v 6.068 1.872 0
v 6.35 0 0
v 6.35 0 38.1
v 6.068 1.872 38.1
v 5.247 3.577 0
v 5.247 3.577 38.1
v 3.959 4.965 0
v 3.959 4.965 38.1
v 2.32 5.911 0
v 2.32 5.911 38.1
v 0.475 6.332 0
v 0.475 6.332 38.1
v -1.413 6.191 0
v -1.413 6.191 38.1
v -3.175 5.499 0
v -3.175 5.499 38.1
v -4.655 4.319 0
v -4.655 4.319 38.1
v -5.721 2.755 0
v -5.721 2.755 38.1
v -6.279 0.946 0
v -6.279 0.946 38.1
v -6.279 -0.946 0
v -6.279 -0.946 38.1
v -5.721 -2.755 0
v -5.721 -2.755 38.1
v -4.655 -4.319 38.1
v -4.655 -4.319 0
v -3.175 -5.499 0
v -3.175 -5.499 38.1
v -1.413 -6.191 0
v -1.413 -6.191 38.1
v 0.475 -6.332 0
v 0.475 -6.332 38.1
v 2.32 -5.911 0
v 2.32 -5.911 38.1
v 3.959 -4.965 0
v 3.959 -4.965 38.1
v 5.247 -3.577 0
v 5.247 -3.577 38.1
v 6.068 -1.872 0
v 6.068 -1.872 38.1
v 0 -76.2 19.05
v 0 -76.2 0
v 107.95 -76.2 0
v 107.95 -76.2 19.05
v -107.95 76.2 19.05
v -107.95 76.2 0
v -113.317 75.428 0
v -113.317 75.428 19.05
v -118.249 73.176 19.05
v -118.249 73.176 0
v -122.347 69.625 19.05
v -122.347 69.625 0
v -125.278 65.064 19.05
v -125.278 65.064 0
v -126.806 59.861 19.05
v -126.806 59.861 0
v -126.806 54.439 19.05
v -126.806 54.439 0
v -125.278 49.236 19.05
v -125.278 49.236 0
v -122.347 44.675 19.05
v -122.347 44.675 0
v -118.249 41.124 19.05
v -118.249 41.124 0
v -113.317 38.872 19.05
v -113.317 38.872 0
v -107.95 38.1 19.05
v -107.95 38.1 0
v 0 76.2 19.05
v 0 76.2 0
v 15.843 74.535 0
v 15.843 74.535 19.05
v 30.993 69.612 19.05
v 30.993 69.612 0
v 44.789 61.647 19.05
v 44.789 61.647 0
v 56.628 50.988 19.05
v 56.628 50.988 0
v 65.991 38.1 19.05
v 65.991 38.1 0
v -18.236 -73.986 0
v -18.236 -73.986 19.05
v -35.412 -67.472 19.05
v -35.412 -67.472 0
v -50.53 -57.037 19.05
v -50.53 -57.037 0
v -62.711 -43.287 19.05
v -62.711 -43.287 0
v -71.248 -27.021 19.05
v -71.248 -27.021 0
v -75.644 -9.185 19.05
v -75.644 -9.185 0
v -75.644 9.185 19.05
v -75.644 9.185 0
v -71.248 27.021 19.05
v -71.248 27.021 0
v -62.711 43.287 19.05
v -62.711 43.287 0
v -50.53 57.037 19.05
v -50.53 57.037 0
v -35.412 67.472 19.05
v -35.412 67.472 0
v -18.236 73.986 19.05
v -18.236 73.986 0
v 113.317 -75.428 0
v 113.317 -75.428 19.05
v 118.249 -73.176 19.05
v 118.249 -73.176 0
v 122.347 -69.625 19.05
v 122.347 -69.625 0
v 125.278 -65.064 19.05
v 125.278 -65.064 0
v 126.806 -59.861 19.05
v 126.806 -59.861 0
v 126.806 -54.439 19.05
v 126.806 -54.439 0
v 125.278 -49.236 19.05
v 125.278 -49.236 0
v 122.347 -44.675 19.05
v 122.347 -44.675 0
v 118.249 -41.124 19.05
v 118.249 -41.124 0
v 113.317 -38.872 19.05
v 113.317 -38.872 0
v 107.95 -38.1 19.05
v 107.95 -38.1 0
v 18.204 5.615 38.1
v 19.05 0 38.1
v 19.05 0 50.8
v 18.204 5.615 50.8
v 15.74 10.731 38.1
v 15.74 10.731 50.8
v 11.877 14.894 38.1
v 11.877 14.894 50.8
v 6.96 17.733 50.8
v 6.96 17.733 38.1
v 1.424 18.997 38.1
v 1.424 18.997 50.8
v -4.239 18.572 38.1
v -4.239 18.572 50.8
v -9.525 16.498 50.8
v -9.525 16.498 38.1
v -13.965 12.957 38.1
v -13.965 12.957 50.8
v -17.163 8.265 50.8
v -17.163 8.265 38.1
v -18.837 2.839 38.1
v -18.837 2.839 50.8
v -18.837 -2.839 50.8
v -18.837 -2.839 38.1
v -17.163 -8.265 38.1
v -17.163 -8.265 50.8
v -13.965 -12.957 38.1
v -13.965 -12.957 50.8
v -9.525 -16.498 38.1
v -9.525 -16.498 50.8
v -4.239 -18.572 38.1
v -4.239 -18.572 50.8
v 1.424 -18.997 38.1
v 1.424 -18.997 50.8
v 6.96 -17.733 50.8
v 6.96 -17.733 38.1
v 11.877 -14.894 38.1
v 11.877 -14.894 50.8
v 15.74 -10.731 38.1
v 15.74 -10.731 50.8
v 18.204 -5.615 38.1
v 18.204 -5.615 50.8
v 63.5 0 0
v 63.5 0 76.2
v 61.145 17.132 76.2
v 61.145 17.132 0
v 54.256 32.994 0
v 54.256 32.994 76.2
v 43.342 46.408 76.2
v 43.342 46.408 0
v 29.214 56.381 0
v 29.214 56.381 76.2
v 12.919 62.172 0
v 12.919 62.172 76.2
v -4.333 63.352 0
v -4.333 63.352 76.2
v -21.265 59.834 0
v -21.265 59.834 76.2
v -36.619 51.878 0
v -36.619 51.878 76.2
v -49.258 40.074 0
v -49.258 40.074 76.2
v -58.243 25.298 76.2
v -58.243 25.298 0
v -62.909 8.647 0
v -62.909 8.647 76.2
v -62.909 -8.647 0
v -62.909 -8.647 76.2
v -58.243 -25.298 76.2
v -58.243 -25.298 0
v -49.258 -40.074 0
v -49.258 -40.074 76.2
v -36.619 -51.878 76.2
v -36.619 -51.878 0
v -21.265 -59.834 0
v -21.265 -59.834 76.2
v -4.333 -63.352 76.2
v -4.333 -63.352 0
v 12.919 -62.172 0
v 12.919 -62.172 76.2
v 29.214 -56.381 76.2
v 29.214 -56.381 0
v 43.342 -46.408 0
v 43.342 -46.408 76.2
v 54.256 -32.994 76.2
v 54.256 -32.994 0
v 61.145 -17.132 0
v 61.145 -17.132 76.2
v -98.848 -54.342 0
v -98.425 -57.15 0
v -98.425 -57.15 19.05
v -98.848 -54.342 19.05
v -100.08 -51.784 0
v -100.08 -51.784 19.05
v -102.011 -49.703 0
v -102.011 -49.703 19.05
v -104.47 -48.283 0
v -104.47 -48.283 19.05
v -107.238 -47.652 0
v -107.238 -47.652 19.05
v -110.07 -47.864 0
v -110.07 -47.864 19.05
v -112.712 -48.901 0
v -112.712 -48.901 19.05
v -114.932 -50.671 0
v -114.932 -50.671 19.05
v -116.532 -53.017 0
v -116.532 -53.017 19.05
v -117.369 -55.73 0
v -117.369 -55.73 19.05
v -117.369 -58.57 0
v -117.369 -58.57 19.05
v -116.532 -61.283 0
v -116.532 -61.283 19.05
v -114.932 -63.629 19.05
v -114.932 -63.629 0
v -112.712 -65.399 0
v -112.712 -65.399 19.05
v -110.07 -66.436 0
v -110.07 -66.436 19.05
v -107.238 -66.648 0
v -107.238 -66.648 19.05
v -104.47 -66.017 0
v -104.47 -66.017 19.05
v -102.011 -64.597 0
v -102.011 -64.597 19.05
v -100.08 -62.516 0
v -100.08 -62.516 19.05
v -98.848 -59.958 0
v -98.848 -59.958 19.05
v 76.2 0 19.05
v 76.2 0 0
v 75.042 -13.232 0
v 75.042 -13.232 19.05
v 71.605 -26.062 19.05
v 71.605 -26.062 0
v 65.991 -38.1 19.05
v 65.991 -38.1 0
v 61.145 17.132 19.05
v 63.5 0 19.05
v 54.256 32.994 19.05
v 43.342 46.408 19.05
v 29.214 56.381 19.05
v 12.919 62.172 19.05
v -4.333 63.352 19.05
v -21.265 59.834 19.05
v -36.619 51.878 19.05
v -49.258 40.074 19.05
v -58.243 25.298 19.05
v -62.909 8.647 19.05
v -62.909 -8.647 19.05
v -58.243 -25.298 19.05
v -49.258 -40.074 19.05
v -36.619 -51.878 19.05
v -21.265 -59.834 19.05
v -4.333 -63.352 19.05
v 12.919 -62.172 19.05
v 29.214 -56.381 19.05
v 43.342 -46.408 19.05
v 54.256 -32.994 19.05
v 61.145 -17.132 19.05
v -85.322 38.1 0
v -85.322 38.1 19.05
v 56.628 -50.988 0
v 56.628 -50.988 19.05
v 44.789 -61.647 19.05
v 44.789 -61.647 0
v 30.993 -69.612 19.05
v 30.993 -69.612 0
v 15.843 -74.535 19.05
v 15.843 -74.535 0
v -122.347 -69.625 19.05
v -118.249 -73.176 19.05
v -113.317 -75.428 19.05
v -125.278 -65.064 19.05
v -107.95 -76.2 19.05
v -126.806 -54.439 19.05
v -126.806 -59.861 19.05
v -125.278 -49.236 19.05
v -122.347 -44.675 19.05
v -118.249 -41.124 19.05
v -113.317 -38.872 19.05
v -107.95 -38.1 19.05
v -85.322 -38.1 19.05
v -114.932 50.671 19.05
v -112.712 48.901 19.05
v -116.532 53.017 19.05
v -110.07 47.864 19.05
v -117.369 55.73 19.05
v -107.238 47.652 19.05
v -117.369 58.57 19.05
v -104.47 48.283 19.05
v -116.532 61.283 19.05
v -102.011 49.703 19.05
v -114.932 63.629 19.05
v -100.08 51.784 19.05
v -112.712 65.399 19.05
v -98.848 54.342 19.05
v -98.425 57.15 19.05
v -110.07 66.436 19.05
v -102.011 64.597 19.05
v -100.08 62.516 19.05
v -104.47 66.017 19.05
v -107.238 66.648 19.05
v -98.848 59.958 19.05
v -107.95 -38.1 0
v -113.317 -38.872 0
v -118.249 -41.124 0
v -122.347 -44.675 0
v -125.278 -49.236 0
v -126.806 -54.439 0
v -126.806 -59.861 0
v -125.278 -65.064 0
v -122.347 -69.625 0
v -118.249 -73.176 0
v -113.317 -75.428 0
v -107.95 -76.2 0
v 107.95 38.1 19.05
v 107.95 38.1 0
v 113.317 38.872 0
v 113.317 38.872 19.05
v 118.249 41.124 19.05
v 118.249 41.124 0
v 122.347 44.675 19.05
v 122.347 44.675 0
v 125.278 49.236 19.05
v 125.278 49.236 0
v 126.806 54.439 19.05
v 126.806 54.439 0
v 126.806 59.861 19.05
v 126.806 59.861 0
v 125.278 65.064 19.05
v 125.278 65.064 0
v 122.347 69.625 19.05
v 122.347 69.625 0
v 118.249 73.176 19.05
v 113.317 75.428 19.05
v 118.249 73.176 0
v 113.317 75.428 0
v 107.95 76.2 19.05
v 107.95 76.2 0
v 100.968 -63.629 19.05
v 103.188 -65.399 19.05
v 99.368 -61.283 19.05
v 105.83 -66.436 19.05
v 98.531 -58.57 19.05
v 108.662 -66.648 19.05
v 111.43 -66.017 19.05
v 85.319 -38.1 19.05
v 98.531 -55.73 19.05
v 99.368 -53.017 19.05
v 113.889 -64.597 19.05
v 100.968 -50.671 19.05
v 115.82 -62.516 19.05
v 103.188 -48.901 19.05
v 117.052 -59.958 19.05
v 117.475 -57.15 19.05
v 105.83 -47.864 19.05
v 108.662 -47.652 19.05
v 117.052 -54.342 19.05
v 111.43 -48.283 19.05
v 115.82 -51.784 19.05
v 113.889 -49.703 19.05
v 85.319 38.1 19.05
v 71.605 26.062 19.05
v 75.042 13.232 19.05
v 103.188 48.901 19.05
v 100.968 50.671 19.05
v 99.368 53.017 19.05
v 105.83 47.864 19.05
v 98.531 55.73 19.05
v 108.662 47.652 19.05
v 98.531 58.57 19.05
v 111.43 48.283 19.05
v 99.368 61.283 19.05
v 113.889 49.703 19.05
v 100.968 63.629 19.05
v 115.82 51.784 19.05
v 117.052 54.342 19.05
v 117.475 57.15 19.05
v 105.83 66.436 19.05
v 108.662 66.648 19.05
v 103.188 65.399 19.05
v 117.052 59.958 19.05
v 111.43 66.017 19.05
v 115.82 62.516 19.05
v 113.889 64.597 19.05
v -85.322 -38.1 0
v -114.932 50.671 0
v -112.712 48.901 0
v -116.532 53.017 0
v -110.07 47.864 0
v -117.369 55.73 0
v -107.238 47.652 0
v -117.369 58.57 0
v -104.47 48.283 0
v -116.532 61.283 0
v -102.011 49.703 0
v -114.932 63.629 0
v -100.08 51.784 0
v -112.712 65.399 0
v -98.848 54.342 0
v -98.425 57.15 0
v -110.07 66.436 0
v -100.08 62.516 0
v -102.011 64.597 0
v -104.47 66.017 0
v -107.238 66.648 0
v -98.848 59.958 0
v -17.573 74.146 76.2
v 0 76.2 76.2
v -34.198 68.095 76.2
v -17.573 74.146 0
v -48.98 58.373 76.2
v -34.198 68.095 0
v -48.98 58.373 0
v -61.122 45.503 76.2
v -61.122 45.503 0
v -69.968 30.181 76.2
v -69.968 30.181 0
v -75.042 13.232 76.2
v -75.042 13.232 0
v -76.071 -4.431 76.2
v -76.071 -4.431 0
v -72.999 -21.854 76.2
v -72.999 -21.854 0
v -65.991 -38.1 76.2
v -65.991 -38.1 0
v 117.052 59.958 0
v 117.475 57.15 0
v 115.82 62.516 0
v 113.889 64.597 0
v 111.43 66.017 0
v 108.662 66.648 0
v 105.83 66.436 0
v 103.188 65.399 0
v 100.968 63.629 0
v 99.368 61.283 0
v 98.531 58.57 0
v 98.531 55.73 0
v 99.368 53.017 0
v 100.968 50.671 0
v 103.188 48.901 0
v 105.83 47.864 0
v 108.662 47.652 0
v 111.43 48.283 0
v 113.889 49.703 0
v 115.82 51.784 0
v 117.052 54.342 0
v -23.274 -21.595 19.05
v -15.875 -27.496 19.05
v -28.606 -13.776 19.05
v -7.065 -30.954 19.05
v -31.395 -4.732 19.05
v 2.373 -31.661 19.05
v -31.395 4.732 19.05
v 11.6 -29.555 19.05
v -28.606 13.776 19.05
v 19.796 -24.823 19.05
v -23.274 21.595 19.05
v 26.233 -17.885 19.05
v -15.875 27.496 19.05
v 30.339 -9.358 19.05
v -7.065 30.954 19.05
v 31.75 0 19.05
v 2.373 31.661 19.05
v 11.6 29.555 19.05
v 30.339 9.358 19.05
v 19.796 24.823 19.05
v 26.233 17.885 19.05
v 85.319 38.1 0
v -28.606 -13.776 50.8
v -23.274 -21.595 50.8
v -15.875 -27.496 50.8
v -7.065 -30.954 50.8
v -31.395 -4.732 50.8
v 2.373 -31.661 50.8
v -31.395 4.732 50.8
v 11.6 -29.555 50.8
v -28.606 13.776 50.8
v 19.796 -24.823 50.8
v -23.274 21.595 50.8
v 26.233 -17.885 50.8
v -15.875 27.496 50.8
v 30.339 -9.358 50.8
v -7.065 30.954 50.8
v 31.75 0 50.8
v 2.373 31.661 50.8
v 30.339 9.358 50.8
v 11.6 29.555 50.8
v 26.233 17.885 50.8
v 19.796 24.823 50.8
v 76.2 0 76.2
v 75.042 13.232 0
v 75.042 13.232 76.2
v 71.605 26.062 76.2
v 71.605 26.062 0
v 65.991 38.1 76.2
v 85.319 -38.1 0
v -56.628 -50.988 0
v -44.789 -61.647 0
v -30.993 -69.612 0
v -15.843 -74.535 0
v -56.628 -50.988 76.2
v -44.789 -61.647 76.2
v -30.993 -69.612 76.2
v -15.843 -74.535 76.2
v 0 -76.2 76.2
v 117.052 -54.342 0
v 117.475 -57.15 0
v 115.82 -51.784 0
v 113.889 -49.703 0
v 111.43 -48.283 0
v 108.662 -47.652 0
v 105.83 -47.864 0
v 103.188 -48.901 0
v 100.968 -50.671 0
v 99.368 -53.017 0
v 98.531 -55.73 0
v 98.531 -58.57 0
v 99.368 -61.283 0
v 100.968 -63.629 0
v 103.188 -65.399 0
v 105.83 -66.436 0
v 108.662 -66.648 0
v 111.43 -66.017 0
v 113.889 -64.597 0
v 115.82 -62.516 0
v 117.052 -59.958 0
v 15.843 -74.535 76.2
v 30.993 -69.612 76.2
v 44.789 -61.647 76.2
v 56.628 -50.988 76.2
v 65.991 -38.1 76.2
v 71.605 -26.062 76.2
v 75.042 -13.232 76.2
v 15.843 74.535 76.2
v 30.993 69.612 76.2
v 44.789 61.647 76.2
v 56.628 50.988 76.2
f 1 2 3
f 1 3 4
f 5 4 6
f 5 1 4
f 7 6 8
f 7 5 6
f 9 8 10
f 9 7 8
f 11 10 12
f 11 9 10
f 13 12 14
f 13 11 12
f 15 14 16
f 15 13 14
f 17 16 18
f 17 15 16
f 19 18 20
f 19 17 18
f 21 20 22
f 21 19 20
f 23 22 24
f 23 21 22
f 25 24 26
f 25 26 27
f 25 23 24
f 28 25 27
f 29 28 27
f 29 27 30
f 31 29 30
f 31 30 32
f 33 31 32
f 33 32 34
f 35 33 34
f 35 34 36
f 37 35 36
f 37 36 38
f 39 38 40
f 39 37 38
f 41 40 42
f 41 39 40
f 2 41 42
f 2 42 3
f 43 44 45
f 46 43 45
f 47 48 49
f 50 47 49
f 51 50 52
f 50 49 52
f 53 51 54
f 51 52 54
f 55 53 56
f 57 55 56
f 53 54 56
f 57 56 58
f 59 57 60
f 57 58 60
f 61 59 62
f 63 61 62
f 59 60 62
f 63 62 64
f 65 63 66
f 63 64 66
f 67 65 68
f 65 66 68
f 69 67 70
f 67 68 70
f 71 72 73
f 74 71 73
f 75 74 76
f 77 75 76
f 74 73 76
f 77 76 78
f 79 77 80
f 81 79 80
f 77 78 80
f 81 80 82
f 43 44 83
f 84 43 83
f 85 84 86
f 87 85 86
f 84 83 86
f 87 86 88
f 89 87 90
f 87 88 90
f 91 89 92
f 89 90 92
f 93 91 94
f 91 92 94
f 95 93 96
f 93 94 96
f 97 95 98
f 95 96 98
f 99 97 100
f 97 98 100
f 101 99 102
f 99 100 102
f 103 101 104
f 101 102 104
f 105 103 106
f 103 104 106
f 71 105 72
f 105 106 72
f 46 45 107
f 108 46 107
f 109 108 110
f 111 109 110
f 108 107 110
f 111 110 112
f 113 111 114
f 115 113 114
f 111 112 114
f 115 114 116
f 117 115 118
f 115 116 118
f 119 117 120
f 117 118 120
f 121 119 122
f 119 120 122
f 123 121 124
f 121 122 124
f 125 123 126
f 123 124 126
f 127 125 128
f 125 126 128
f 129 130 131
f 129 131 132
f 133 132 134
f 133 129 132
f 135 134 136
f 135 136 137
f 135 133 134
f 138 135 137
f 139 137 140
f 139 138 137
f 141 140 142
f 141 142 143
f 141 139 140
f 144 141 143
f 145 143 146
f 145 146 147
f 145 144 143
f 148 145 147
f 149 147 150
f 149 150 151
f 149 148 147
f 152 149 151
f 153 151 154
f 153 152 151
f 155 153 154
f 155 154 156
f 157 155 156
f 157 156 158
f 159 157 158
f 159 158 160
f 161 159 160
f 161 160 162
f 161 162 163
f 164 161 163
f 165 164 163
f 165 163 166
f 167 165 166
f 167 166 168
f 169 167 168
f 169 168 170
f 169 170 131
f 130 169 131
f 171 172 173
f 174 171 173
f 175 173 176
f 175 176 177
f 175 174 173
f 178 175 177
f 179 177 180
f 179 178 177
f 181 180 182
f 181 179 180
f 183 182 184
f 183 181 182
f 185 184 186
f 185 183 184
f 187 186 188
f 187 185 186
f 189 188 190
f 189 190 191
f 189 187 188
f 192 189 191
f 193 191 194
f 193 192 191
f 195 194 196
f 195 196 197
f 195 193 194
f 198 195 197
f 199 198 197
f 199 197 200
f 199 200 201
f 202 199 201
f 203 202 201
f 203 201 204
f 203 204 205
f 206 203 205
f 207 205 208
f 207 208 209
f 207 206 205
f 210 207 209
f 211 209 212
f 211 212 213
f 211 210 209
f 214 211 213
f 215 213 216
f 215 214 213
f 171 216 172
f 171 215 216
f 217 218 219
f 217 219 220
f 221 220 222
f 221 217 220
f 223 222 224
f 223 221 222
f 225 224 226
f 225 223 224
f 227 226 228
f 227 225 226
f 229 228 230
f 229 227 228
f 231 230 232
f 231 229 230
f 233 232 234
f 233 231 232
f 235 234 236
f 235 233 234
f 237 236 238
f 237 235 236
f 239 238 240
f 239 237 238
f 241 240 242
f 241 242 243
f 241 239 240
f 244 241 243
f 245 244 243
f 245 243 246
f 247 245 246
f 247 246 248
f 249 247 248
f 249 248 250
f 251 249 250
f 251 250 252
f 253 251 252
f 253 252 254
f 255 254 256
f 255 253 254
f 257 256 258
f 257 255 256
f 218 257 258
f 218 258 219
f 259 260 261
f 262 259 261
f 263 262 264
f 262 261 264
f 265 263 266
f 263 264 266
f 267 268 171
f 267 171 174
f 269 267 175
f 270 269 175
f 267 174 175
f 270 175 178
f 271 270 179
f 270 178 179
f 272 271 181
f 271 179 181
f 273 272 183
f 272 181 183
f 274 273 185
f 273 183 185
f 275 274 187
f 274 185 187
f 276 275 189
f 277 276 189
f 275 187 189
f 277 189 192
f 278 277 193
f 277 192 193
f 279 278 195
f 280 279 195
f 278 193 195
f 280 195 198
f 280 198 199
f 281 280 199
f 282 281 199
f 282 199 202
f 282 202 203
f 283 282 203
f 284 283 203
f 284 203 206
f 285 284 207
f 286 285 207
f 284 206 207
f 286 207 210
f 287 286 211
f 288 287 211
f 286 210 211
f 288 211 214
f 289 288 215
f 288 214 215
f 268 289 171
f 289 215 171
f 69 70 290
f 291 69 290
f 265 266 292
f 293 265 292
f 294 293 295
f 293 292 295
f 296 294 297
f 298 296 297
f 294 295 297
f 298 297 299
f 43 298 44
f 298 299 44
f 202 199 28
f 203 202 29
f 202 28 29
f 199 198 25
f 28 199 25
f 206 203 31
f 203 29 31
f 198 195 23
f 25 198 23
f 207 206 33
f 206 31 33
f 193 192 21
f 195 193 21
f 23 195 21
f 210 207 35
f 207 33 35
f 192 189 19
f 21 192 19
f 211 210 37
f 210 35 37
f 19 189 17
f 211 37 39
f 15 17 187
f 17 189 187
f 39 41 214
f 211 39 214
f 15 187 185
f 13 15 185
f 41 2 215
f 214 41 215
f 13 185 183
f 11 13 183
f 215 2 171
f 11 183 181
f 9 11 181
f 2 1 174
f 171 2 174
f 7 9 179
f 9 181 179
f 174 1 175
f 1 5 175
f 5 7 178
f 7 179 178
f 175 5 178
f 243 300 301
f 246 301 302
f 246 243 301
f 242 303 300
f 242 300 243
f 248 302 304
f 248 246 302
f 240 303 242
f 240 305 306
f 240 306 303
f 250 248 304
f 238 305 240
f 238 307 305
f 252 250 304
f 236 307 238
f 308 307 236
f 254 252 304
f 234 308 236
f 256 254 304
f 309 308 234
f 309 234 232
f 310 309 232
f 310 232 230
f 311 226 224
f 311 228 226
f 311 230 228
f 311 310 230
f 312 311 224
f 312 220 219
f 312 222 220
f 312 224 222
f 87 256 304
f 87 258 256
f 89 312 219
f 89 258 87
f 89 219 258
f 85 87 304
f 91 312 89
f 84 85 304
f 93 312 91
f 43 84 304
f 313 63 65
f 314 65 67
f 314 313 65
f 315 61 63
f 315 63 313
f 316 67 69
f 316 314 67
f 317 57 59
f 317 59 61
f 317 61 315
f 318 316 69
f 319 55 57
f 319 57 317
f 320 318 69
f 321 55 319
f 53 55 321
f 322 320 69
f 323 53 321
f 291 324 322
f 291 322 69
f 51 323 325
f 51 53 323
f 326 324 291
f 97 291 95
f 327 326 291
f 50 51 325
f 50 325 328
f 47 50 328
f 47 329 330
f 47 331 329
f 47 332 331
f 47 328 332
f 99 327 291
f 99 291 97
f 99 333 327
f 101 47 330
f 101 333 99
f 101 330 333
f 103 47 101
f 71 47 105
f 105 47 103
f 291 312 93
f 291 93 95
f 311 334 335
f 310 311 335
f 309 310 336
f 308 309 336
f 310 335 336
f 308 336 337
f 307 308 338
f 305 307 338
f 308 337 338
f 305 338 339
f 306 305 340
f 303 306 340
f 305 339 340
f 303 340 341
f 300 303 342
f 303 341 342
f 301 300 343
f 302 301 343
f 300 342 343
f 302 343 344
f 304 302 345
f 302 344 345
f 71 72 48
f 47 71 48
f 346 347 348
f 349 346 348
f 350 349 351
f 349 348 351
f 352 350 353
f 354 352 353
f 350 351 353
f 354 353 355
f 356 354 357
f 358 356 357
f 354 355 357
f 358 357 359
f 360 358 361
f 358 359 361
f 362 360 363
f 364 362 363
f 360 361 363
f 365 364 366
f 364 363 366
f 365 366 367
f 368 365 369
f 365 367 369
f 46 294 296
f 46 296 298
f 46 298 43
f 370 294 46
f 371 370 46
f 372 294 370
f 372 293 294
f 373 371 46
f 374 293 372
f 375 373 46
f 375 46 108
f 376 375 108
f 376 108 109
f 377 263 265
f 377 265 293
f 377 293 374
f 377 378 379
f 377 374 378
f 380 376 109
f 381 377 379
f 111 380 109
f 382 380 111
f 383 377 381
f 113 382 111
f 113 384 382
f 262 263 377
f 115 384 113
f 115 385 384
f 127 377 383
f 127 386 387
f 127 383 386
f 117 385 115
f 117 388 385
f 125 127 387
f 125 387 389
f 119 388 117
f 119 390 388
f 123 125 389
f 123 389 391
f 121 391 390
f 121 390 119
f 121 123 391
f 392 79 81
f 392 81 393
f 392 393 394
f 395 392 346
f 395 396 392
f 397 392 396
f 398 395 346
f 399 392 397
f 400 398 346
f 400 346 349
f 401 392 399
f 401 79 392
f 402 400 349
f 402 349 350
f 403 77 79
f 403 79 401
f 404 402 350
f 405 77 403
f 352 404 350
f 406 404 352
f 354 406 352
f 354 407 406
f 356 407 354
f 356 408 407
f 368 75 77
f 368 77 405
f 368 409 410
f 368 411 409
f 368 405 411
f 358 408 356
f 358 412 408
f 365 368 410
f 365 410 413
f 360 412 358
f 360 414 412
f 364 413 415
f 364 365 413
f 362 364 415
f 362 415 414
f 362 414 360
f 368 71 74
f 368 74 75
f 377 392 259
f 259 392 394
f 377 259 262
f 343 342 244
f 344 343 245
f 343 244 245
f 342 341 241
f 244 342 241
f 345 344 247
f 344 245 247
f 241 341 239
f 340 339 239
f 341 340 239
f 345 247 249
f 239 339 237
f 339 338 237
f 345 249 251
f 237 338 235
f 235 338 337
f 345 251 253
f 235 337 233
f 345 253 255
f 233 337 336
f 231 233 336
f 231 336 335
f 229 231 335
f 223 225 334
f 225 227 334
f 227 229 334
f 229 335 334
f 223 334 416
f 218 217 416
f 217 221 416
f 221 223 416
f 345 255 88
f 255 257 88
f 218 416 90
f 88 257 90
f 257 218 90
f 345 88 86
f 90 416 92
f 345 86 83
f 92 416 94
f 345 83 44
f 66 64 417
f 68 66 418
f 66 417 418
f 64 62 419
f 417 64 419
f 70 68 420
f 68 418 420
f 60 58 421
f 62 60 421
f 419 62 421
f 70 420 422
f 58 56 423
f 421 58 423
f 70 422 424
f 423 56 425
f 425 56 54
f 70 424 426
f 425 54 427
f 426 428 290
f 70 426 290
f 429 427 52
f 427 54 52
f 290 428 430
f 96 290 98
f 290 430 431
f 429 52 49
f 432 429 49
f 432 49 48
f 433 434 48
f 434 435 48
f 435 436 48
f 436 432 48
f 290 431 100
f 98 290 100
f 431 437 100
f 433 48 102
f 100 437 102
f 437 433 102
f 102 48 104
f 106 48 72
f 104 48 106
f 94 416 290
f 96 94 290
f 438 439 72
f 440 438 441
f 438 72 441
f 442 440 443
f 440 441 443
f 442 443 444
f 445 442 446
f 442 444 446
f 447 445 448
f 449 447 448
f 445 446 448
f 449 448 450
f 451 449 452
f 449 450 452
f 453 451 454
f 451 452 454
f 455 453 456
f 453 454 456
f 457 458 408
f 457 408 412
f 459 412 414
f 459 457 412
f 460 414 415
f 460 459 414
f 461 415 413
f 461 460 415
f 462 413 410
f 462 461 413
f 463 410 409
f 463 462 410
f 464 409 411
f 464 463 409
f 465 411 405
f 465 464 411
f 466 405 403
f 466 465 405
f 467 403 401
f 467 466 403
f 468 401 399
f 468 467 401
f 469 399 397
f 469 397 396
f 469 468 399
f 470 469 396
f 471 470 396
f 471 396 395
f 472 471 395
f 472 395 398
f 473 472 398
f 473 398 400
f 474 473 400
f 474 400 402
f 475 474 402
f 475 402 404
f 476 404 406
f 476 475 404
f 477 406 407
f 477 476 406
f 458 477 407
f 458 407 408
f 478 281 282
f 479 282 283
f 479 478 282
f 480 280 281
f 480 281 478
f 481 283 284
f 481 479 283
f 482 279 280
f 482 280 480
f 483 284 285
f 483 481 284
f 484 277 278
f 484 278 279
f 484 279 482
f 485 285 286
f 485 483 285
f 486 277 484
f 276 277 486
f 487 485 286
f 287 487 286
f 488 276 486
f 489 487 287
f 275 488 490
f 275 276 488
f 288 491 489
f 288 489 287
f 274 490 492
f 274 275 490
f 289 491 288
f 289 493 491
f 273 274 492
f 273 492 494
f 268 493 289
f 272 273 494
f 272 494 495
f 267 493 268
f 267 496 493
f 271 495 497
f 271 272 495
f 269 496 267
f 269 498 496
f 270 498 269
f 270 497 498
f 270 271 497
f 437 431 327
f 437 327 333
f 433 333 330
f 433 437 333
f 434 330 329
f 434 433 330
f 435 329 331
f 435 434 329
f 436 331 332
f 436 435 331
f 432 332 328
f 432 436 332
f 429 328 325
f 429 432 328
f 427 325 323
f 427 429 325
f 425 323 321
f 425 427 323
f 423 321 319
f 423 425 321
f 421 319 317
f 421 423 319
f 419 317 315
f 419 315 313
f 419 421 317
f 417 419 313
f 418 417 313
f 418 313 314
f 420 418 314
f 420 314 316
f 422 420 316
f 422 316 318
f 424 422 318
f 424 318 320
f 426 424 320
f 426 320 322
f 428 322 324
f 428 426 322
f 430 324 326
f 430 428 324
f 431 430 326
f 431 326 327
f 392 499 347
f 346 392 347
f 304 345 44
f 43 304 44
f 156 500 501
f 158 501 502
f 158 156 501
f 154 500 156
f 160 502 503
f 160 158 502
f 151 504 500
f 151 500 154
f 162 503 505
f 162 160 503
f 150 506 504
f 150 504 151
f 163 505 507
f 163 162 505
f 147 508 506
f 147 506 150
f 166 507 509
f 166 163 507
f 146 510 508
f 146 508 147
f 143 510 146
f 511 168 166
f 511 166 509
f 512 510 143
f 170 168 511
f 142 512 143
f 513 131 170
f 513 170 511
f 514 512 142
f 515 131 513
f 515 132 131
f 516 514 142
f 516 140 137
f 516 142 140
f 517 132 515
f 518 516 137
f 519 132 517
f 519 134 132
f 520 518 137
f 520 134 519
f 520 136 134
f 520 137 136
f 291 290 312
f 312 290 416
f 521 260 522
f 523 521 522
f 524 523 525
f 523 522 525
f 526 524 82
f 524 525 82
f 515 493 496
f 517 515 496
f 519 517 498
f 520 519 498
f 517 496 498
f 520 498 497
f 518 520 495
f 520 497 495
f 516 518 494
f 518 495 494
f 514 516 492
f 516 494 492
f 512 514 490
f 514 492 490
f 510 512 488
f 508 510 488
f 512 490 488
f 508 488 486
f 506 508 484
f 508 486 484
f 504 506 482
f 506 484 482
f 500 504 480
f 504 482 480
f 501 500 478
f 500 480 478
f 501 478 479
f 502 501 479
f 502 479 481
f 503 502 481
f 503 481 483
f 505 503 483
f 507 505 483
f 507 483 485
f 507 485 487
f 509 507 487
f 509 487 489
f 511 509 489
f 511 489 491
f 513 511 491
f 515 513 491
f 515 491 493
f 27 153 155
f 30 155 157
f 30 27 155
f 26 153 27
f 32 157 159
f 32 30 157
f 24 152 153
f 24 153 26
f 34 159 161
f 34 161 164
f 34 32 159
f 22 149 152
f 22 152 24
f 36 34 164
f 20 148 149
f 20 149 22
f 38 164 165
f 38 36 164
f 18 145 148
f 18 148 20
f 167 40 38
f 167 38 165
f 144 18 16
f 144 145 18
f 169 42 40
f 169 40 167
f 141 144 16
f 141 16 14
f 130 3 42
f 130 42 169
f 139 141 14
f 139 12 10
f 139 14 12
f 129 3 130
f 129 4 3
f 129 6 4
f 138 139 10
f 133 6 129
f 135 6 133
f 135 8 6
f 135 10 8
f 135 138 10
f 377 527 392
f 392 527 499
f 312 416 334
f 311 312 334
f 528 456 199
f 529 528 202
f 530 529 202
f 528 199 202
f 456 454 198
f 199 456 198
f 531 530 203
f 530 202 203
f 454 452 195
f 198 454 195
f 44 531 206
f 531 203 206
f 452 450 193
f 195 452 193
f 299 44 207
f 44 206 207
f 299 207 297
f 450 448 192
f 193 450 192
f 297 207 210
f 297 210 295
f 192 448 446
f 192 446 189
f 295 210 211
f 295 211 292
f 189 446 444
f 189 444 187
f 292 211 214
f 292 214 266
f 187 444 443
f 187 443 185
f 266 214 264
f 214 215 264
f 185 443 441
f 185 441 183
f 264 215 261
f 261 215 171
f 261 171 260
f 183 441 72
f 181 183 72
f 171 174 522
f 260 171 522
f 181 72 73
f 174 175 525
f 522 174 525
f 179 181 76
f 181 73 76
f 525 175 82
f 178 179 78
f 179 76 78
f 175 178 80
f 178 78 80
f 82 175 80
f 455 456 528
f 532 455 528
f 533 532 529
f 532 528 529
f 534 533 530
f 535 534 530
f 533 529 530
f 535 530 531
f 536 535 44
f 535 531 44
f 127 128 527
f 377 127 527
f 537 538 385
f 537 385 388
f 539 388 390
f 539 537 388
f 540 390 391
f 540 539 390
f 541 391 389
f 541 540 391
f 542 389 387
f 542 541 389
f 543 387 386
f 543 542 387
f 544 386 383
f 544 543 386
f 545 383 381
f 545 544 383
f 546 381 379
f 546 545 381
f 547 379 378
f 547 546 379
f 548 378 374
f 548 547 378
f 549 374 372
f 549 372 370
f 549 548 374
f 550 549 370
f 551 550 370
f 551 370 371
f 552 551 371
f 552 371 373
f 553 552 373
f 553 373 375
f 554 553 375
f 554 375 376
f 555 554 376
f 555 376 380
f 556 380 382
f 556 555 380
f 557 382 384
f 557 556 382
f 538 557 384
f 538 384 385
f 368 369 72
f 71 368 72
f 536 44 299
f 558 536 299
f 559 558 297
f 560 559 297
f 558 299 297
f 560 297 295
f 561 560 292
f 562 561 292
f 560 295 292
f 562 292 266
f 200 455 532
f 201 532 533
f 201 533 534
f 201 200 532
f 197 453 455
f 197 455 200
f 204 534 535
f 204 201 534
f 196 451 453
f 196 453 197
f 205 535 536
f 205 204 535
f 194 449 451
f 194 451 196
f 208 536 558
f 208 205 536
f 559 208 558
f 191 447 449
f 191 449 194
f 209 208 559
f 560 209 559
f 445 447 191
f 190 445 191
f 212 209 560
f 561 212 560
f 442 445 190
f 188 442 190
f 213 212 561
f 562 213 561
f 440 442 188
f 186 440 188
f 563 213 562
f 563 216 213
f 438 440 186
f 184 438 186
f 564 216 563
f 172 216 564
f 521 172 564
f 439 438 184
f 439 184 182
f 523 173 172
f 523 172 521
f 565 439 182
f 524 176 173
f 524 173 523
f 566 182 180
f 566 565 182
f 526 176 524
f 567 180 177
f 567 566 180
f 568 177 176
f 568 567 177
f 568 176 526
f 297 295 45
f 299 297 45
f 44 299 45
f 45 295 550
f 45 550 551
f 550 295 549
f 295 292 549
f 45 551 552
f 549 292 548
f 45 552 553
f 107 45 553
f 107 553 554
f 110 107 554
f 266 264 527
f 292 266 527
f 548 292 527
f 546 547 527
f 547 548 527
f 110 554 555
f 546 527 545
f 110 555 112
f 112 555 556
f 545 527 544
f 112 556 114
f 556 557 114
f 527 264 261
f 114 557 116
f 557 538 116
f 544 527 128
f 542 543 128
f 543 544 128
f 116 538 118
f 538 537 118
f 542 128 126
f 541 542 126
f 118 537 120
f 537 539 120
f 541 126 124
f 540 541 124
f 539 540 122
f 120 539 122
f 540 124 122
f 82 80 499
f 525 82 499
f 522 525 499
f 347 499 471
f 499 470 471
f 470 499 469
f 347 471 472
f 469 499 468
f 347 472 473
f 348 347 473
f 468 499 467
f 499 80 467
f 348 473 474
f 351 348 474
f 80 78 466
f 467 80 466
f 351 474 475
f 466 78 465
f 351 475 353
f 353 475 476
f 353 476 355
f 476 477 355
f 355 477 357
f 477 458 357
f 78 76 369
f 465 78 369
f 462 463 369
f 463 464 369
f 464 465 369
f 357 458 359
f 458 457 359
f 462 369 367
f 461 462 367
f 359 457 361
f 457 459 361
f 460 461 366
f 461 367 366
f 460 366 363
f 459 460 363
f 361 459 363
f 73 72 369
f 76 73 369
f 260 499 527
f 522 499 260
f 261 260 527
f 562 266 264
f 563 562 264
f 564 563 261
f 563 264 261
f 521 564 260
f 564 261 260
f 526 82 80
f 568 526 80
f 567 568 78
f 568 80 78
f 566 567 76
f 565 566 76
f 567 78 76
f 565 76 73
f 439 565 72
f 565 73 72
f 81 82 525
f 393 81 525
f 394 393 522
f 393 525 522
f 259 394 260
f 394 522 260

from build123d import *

# Parameters (mm, degrees)
F0_R     = 9.525
F1_DEPTH = 19.05
F0_R_2   = 63.5
F0_R_3   = 31.75
F2_DEPTH = 76.2
F0_R_4   = 19.05
F3_DEPTH = 50.8
F0_R_5   = 6.35
F4_DEPTH = 38.1


with BuildPart() as f1:
    # F0 (on Top) → F1 (new body)
    with BuildSketch(Plane.XY):
        with BuildLine():
            Line((-107.95, -76.2), (0, -76.2))
            ThreePointArc((0, -76.2), (-38.1, -65.9911357684), (-65.9911357684, -38.1))
            Line((-65.9911357684, -38.1), (-85.3222459555, -38.1))
            Line((-85.3222459555, -38.1), (-107.95, -38.1))
            ThreePointArc((-107.95, -38.1), (-94.4796158184, -43.6796158184), (-88.9, -57.15))
            ThreePointArc((-88.9, -57.15), (-94.4796158184, -70.6203841816), (-107.95, -76.2))
        make_face()
        with BuildLine():
            ThreePointArc((-65.9911357684, 38.1), (-38.1, 65.9911357684), (0, 76.2))
            Line((0, 76.2), (-107.95, 76.2))
            ThreePointArc((-107.95, 76.2), (-94.4796158184, 70.6203841816), (-88.9, 57.15))
            ThreePointArc((-88.9, 57.15), (-94.4796158184, 43.6796158184), (-107.95, 38.1))
            Line((-107.95, 38.1), (-85.3222459555, 38.1))
            Line((-85.3222459555, 38.1), (-65.9911357684, 38.1))
        make_face()
        with BuildLine():
            ThreePointArc((-88.9, 57.15), (-94.4796158184, 70.6203841816), (-107.95, 76.2))
            ThreePointArc((-107.95, 76.2), (-127, 57.15), (-107.95, 38.1))
            ThreePointArc((-107.95, 38.1), (-94.4796158184, 43.6796158184), (-88.9, 57.15))
        make_face()
        with Locations((-107.95, 57.15)):
            Circle(F0_R, mode=Mode.SUBTRACT)
        with BuildLine():
            ThreePointArc((-107.95, -38.1), (-127, -57.15), (-107.95, -76.2))
            ThreePointArc((-107.95, -76.2), (-94.4796158184, -70.6203841816), (-88.9, -57.15))
            ThreePointArc((-88.9, -57.15), (-94.4796158184, -43.6796158184), (-107.95, -38.1))
        make_face()
        with Locations((-107.95, -57.15)):
            Circle(F0_R, mode=Mode.SUBTRACT)
        with BuildLine():
            ThreePointArc((-65.9911357684, -38.1), (-76.2, 0), (-65.9911357684, 38.1))
            Line((-65.9911357684, 38.1), (-85.3222459555, 38.1))
            Line((-85.3222459555, 38.1), (-85.3222459555, -38.1))
            Line((-85.3222459555, -38.1), (-65.9911357684, -38.1))
        make_face()
    extrude(amount=F1_DEPTH)


with BuildPart() as f1b:
    # F0 (on Top) → F1, piece 2 (new body)
    with BuildSketch(Plane.XY):
        with BuildLine():
            ThreePointArc((0, 76.2), (38.1, 65.9911357684), (65.9911357684, 38.1))
            Line((65.9911357684, 38.1), (85.3186, 38.1))
            Line((85.3186, 38.1), (107.95, 38.1))
            ThreePointArc((107.95, 38.1), (88.9, 57.15), (107.95, 76.2))
            Line((107.95, 76.2), (0, 76.2))
        make_face()
        with BuildLine():
            ThreePointArc((127, 57.15), (121.4203841816, 70.6203841816), (107.95, 76.2))
            ThreePointArc((107.95, 76.2), (88.9, 57.15), (107.95, 38.1))
            ThreePointArc((107.95, 38.1), (121.4203841816, 43.6796158184), (127, 57.15))
        make_face()
        with Locations((107.95, 57.15)):
            Circle(F0_R, mode=Mode.SUBTRACT)
        with BuildLine():
            Line((85.3186, -38.1), (65.9911357684, -38.1))
            ThreePointArc((65.9911357684, -38.1), (38.1, -65.9911357684), (0, -76.2))
            Line((0, -76.2), (107.95, -76.2))
            ThreePointArc((107.95, -76.2), (88.9, -57.15), (107.95, -38.1))
            Line((107.95, -38.1), (85.3186, -38.1))
        make_face()
        with BuildLine():
            ThreePointArc((107.95, -38.1), (88.9, -57.15), (107.95, -76.2))
            ThreePointArc((107.95, -76.2), (121.4203841816, -70.6203841816), (127, -57.15))
            ThreePointArc((127, -57.15), (121.4203841816, -43.6796158184), (107.95, -38.1))
        make_face()
        with Locations((107.95, -57.15)):
            Circle(F0_R, mode=Mode.SUBTRACT)
        with BuildLine():
            ThreePointArc((65.9911357684, 38.1), (73.6035479632, 19.7220112368), (76.2, 0))
            ThreePointArc((76.2, 0), (73.6035479632, -19.7220112368), (65.9911357684, -38.1))
            Line((65.9911357684, -38.1), (85.3186, -38.1))
            Line((85.3186, -38.1), (85.3186, 38.1))
            Line((85.3186, 38.1), (65.9911357684, 38.1))
        make_face()
    extrude(amount=F1_DEPTH)


with BuildPart() as f1c:
    # F0 (on Top) → F1, piece 3 (new body)
    with BuildSketch(Plane.XY):
        Circle(F0_R_2)
        Circle(F0_R_3, mode=Mode.SUBTRACT)
    extrude(amount=F1_DEPTH)

    # F0 (on Top) → F3 (join)
    with BuildSketch(Plane.XY):
        Circle(F0_R_3)
        Circle(F0_R_4, mode=Mode.SUBTRACT)
    extrude(amount=F3_DEPTH)

    # F0 (on Top) → F4 (join)
    with BuildSketch(Plane.XY):
        Circle(F0_R_4)
        Circle(F0_R_5, mode=Mode.SUBTRACT)
    extrude(amount=F4_DEPTH)


with BuildPart() as f2:
    # F0 (on Top) → F2 (new body)
    with BuildSketch(Plane.XY):
        with BuildLine():
            ThreePointArc((65.9911357684, -38.1), (73.6035479632, -19.7220112368), (76.2, 0))
            ThreePointArc((76.2, 0), (73.6035479632, 19.7220112368), (65.9911357684, 38.1))
            ThreePointArc((65.9911357684, 38.1), (38.1, 65.9911357684), (0, 76.2))
            ThreePointArc((0, 76.2), (-38.1, 65.9911357684), (-65.9911357684, 38.1))
            ThreePointArc((-65.9911357684, 38.1), (-76.2, 0), (-65.9911357684, -38.1))
            ThreePointArc((-65.9911357684, -38.1), (-38.1, -65.9911357684), (0, -76.2))
            ThreePointArc((0, -76.2), (38.1, -65.9911357684), (65.9911357684, -38.1))
        make_face()
        Circle(F0_R_2, mode=Mode.SUBTRACT)
    extrude(amount=F2_DEPTH)


solid = Compound([f1.part, f1b.part, f1c.part, f2.part])
